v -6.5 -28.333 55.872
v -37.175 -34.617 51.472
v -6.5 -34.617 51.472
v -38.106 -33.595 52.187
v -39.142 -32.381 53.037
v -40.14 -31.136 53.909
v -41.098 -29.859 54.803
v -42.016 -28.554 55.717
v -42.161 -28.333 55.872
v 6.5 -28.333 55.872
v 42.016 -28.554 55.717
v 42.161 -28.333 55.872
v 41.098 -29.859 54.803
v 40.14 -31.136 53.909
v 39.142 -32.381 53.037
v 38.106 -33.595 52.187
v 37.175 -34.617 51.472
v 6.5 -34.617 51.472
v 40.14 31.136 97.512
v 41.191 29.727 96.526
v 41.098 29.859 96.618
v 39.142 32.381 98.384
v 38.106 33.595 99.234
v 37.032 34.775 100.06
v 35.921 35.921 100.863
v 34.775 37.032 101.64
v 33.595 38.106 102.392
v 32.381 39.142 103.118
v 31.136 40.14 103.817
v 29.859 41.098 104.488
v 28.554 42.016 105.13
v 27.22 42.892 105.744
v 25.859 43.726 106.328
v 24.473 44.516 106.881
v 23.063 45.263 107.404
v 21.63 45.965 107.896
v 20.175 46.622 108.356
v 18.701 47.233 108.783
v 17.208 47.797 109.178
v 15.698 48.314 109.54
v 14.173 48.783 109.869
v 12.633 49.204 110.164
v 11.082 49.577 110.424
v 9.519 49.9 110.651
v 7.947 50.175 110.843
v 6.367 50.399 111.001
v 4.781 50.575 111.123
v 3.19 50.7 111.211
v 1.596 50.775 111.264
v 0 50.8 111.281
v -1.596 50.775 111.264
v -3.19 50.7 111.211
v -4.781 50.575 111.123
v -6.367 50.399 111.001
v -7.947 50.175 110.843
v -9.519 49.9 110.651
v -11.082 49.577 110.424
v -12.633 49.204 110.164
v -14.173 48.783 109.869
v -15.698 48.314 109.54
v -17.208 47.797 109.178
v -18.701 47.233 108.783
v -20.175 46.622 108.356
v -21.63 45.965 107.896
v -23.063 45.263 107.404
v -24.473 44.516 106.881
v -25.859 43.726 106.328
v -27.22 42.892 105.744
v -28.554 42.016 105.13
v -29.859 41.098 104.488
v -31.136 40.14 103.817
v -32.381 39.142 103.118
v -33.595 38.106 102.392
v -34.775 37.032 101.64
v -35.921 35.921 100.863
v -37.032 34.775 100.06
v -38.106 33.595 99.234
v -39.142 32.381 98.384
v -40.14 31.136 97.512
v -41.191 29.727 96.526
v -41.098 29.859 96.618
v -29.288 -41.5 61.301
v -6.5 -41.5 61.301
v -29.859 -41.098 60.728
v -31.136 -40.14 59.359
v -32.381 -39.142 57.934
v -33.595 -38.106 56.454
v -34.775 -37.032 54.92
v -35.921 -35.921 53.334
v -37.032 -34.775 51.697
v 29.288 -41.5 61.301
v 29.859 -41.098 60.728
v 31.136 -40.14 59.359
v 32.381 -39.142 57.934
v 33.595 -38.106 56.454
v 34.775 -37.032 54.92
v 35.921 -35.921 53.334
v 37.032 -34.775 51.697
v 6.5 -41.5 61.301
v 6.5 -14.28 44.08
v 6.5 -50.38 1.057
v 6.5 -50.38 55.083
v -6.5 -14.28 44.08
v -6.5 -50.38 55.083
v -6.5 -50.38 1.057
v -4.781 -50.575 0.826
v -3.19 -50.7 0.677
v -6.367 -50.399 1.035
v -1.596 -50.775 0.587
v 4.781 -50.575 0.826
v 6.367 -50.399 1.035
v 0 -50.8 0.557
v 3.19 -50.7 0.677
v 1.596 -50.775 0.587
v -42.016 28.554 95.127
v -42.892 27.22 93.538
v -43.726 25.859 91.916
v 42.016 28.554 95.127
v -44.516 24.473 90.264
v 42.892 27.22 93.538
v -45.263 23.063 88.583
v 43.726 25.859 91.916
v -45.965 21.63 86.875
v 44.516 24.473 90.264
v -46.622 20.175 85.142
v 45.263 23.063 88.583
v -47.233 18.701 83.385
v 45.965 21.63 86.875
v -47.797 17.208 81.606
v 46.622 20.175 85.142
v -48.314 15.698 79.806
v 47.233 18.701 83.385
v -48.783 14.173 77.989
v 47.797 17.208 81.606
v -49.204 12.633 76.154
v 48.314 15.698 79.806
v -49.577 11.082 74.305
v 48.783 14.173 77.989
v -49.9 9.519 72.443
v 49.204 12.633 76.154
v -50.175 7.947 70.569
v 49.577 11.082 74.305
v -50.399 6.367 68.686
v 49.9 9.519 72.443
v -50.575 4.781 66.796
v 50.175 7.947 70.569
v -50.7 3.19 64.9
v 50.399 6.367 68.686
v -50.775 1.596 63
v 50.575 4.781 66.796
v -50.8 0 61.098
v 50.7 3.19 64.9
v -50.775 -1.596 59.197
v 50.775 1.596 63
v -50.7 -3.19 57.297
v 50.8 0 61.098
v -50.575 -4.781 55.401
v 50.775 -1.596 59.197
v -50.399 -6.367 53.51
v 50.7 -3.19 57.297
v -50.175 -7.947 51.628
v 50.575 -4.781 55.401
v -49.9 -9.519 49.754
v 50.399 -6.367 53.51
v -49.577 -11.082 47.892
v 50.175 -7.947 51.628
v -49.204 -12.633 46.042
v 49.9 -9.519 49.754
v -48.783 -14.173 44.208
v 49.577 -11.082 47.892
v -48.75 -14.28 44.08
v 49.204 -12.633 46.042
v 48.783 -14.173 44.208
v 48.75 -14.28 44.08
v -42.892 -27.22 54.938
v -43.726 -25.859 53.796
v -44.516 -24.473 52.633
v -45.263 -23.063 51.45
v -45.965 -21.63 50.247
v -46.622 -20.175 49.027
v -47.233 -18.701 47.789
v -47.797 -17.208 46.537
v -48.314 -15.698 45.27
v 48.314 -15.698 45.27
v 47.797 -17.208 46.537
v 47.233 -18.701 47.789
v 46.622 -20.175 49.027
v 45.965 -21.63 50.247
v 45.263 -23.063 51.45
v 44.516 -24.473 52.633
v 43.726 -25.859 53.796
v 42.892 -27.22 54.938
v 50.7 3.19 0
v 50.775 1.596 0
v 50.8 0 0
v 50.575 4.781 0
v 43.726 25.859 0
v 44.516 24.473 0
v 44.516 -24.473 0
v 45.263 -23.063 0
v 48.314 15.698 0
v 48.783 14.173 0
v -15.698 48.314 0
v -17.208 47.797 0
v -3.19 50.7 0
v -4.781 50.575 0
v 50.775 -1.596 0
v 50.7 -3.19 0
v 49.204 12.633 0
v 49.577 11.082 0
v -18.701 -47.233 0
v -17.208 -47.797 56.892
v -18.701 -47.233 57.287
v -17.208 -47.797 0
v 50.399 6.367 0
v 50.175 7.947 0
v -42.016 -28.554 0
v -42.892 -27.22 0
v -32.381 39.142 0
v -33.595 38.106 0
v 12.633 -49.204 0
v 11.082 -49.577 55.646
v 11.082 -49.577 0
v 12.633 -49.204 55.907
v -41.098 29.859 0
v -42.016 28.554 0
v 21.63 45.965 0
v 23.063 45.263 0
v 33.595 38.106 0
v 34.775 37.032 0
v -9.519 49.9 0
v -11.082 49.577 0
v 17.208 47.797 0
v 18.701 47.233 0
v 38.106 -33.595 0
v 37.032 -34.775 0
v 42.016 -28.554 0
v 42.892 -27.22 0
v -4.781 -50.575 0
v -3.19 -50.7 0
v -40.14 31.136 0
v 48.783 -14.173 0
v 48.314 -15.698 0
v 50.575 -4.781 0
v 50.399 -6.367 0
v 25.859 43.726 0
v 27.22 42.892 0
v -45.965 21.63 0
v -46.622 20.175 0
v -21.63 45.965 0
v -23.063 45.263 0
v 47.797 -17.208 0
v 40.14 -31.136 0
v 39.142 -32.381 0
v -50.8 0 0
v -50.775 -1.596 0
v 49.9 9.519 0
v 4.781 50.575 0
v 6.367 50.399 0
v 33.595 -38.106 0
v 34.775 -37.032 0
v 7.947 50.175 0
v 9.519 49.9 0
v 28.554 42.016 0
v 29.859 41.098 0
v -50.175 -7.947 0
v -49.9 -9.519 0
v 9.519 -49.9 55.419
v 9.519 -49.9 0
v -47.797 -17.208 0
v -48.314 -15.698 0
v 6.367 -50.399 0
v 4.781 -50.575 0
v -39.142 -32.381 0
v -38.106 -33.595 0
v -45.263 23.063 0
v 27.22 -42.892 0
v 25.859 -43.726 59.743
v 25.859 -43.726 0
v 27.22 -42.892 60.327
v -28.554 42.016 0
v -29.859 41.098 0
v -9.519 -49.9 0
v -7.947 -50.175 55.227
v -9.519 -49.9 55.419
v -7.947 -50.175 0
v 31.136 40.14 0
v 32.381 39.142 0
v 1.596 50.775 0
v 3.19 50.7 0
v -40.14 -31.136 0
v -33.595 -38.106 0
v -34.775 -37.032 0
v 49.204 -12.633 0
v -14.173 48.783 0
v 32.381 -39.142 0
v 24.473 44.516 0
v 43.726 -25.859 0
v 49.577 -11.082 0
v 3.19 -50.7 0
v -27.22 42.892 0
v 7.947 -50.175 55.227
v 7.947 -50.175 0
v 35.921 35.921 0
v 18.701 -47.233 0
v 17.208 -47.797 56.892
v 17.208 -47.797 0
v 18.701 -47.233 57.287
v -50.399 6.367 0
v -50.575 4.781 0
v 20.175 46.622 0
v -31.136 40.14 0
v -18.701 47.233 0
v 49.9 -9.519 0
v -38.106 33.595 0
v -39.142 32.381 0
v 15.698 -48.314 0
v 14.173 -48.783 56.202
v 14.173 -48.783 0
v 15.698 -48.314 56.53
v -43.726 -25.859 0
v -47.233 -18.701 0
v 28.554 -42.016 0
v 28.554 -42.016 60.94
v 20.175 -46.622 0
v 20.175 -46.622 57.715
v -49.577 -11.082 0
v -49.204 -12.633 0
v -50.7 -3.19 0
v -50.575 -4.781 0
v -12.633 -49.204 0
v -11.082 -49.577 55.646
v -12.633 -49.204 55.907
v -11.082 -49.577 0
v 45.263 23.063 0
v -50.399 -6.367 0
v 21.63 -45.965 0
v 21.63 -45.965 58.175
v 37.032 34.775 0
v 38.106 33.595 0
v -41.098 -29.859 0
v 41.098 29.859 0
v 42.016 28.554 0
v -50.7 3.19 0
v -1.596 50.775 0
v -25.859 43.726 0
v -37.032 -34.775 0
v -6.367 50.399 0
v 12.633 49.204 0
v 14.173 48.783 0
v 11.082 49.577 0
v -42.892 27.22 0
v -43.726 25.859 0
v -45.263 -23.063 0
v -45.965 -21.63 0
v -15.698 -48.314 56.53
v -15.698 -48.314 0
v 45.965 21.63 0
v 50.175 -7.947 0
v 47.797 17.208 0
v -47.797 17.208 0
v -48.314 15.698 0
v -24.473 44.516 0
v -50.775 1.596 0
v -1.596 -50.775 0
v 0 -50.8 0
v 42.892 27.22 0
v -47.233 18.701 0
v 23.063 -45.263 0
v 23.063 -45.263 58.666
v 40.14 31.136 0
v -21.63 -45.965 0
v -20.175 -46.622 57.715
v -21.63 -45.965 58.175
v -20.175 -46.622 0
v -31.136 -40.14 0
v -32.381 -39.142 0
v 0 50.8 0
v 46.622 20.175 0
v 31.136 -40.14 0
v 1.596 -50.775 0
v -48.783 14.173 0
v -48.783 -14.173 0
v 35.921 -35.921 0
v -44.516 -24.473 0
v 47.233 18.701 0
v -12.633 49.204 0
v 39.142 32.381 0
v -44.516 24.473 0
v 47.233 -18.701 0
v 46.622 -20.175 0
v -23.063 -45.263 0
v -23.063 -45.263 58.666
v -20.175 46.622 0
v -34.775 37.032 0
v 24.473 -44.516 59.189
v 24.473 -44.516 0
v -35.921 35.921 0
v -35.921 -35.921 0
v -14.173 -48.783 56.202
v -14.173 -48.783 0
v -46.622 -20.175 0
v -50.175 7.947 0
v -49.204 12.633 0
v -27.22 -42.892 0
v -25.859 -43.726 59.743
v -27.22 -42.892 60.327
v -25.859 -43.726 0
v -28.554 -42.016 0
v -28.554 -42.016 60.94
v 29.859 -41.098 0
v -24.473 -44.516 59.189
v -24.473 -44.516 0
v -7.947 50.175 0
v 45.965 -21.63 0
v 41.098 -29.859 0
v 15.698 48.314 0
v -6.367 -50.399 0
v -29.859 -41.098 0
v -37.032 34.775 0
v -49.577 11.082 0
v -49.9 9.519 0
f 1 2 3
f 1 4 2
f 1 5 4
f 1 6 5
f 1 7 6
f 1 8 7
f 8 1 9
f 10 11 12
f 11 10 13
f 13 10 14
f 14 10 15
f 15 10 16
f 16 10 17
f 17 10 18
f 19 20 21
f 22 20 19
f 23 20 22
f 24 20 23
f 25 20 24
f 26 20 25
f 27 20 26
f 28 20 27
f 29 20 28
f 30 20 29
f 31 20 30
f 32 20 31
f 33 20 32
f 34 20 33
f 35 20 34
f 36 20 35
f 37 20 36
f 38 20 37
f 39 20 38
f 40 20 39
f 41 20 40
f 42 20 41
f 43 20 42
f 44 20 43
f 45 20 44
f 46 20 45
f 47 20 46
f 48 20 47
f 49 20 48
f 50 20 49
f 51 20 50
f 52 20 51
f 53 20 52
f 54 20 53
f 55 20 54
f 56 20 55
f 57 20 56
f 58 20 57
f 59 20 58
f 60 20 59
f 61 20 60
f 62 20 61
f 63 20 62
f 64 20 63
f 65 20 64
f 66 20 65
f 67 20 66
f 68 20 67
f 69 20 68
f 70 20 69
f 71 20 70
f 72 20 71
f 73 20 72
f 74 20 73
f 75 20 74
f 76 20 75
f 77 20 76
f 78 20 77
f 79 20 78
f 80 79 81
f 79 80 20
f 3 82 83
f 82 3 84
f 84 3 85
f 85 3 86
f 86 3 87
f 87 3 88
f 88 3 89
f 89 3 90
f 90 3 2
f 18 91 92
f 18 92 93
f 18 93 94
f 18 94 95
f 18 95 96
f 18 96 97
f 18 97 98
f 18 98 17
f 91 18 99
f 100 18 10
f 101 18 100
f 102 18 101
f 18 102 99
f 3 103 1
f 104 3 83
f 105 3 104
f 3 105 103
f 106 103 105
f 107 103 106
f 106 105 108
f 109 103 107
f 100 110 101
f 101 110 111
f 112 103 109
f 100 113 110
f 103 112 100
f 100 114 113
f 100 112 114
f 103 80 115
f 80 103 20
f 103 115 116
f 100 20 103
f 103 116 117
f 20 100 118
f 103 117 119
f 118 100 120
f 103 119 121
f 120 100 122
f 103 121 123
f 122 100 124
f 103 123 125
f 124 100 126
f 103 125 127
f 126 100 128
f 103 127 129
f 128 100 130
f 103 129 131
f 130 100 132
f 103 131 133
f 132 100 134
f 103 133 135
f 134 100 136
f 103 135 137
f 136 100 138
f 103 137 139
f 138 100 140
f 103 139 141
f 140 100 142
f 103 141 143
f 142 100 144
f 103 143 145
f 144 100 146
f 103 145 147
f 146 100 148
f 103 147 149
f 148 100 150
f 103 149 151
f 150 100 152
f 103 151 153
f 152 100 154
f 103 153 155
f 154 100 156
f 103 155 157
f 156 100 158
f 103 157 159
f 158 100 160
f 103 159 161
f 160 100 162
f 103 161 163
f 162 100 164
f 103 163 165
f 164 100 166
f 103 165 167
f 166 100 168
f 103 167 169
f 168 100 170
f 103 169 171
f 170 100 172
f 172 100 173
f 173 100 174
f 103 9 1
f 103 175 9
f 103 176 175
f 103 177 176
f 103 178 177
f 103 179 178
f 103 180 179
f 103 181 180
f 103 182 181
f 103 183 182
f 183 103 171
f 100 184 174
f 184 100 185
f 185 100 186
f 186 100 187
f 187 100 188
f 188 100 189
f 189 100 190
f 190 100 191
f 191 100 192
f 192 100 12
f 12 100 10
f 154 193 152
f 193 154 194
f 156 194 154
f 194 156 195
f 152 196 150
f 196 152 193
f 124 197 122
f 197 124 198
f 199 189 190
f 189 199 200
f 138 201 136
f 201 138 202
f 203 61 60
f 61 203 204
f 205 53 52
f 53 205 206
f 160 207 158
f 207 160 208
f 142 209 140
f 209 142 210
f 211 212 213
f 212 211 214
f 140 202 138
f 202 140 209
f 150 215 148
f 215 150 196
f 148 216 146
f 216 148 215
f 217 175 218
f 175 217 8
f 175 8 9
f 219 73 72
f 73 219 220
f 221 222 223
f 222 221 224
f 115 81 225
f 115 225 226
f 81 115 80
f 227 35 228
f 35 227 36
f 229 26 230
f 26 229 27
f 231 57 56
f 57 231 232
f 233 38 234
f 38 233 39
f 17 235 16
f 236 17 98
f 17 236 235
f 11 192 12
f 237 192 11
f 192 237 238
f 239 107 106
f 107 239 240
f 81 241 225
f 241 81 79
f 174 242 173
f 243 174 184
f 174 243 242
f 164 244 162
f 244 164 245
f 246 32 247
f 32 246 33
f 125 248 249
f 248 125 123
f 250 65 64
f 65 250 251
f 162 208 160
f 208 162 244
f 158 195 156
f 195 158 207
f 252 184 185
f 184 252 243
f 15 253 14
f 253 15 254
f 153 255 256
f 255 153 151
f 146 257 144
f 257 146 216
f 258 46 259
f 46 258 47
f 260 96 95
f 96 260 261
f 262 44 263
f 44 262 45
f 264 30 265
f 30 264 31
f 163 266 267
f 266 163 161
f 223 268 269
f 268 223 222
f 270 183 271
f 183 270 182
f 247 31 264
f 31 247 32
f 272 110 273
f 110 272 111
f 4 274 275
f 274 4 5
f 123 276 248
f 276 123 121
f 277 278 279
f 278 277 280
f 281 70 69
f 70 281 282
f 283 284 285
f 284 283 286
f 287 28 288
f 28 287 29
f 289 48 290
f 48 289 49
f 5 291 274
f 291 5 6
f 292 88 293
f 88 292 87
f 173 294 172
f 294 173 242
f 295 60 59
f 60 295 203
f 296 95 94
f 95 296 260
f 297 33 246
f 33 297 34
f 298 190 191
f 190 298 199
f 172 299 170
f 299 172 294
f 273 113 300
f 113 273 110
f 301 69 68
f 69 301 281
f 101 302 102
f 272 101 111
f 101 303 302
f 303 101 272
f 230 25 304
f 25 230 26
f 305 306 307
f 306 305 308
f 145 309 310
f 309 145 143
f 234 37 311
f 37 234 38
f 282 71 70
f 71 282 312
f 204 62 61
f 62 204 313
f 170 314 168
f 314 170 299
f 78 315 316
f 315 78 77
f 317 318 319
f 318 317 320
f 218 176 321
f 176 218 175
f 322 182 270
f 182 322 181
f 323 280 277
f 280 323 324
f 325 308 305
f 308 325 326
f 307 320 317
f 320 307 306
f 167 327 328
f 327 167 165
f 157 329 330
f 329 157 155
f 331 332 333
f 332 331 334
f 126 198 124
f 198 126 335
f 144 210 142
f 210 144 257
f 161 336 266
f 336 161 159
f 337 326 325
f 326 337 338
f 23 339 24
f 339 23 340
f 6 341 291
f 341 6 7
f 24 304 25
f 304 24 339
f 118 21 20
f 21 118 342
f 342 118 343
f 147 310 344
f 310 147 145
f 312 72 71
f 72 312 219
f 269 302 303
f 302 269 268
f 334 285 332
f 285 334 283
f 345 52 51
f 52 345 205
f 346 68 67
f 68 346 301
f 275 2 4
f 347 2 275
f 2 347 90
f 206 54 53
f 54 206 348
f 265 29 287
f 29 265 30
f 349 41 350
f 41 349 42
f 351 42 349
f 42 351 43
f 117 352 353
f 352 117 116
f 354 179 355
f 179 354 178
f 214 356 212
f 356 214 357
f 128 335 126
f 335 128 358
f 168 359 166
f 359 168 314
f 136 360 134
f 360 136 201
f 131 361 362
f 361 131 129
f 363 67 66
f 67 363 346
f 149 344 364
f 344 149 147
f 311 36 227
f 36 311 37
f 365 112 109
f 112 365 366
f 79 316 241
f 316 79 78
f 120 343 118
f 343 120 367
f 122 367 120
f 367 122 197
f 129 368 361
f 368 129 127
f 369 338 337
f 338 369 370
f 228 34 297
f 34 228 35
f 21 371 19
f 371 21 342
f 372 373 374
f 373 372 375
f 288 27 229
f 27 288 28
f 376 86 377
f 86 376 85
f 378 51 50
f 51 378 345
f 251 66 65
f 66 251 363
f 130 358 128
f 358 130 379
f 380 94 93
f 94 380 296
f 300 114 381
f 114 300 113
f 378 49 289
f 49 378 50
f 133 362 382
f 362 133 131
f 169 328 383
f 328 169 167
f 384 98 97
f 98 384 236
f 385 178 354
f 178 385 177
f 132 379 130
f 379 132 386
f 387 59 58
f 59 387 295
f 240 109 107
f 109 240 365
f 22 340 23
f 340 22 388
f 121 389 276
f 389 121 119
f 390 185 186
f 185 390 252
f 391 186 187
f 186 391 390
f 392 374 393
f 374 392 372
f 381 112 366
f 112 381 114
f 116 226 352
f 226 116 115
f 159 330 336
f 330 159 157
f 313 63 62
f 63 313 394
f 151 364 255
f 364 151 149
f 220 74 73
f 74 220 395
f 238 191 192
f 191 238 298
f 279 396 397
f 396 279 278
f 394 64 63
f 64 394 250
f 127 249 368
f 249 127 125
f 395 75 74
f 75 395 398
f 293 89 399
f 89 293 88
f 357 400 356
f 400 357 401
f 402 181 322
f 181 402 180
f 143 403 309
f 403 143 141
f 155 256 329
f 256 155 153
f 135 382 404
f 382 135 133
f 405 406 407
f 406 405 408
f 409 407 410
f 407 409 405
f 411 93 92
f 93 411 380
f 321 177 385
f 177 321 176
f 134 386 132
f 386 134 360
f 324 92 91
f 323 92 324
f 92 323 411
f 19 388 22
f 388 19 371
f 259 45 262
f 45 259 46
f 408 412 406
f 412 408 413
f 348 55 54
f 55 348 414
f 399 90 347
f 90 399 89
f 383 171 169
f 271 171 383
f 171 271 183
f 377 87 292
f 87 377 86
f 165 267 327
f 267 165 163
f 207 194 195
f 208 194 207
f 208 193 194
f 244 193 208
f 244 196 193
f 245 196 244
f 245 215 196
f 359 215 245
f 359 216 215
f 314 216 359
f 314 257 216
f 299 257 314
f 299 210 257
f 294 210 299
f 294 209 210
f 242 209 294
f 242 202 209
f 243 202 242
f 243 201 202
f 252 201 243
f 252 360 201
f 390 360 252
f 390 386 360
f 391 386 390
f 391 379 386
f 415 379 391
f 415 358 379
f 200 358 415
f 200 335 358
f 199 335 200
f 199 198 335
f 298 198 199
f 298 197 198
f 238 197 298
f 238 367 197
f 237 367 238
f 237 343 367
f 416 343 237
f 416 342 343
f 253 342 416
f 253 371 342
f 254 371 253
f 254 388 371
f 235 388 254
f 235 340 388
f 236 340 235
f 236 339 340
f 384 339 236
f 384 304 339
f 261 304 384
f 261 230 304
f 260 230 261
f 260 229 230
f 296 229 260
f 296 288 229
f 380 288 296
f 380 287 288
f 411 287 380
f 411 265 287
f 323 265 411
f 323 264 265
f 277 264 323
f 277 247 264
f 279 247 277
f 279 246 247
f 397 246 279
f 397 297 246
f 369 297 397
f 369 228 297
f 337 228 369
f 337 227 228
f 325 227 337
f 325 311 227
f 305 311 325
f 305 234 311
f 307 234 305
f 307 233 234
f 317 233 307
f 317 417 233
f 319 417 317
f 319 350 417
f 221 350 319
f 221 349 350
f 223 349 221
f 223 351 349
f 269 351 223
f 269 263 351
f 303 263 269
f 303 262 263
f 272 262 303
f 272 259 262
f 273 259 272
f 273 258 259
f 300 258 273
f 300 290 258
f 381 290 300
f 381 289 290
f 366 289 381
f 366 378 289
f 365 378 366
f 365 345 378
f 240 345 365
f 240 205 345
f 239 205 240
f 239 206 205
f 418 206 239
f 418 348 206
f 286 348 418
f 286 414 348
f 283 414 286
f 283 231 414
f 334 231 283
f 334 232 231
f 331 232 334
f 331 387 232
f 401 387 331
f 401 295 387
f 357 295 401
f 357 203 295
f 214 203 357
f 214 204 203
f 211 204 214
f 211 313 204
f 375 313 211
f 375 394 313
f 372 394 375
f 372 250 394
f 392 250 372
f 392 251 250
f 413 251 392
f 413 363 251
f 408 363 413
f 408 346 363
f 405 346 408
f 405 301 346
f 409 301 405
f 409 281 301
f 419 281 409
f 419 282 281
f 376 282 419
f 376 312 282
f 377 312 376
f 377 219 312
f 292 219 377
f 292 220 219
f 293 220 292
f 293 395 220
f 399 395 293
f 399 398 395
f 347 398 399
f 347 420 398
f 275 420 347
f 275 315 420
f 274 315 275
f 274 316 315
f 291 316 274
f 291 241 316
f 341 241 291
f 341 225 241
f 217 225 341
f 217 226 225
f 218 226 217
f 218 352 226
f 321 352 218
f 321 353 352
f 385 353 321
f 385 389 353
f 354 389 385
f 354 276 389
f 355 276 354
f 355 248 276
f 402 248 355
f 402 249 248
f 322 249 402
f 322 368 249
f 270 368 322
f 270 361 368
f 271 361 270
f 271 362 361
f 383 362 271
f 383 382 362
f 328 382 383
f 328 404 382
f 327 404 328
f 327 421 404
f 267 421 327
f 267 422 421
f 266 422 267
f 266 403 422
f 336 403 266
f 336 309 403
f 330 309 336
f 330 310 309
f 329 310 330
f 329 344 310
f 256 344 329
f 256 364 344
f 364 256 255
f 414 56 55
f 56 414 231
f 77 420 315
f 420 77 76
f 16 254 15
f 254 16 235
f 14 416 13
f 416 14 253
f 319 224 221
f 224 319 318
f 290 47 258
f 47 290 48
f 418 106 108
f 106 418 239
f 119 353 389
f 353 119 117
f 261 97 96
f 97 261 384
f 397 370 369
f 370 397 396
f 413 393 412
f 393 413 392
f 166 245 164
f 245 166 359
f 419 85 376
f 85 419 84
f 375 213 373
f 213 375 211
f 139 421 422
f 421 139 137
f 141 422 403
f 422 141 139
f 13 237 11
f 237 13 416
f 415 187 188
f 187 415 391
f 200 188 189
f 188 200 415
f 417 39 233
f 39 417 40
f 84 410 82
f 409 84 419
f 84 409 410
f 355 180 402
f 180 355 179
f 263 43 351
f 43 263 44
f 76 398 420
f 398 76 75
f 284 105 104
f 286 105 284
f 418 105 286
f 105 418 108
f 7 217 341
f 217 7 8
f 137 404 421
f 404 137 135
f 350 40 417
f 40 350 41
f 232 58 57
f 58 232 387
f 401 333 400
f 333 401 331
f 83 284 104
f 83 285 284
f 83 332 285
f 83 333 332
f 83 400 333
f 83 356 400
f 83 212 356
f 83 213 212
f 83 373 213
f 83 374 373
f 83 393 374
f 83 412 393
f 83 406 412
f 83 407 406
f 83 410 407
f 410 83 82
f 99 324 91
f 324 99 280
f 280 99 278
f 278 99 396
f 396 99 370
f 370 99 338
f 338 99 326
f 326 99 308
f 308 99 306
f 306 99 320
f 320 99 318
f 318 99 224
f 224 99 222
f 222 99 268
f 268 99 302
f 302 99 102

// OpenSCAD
PIPE_THICKNESS      =   2.5;
PIPE_DIAMETER_INNER = 102;
PIPE_HEIGHT         = 180;
PLUG_WIDTH          =  13;

FRONT_THICKNESS     =  40;
SLANT_1             =  35;
MARGIN_1            =  20;
THICKNESS_1         =  12;

PHONE_THICKNESS     =  20; 
SLANT_2             =  50;

SLANT_3             =  65;

PIPE_DIAMETER_OUTER = PIPE_DIAMETER_INNER + 2 * PIPE_THICKNESS;

ATOM      = 0.01;
TOLERANCE = 0.17;
PLAY      = 0.4;

$fn       = 200;

module pipe() {
    difference() {
        cylinder(d=PIPE_DIAMETER_OUTER, h=PIPE_HEIGHT);
        translate([0, 0, -ATOM])
        cylinder(d=PIPE_DIAMETER_INNER, h=PIPE_HEIGHT+ATOM*2);
    }
}

//%pipe();

difference() {
    cylinder(d=PIPE_DIAMETER_INNER - PLAY, h=PIPE_HEIGHT);

    d = PIPE_DIAMETER_INNER*2;

    // first slant
    translate([0, -d/4, FRONT_THICKNESS])
    rotate([SLANT_1, 0, 0]) {
        translate([0, d/2 + MARGIN_1, d/2])
        cube([d, d, d], center=true);
        translate([0, 0, d/2])
        cube([PLUG_WIDTH, d, d], center=true);
    }

    // shave front rest
    translate([0, -d/4, FRONT_THICKNESS])
    rotate([SLANT_1, 0, 0])
    translate([0, d/3, d/2 + THICKNESS_1])
    cube([d, d, d], center=true);

    // medium slant
    translate([0, -d/4 + d*.18, FRONT_THICKNESS + d*.02])
    rotate([SLANT_2, 0, 0]) {
        translate([0, d/2, PHONE_THICKNESS/2]) 
        cube([d, d, PHONE_THICKNESS], center=true);

        translate([0, 0, d/2])
        cube([PLUG_WIDTH, d, d], center=true);
    }

%    // steep slant
    translate([0, -d/4 + d*.28, FRONT_THICKNESS + d*.02])
    rotate([SLANT_3, 0, 0]) {
        translate([0, d/2, PHONE_THICKNESS/2]) 
        cube([d, d, PHONE_THICKNESS], center=true);

        translate([0, 0, d/2])
        cube([PLUG_WIDTH, d, d], center=true);
    }
}
